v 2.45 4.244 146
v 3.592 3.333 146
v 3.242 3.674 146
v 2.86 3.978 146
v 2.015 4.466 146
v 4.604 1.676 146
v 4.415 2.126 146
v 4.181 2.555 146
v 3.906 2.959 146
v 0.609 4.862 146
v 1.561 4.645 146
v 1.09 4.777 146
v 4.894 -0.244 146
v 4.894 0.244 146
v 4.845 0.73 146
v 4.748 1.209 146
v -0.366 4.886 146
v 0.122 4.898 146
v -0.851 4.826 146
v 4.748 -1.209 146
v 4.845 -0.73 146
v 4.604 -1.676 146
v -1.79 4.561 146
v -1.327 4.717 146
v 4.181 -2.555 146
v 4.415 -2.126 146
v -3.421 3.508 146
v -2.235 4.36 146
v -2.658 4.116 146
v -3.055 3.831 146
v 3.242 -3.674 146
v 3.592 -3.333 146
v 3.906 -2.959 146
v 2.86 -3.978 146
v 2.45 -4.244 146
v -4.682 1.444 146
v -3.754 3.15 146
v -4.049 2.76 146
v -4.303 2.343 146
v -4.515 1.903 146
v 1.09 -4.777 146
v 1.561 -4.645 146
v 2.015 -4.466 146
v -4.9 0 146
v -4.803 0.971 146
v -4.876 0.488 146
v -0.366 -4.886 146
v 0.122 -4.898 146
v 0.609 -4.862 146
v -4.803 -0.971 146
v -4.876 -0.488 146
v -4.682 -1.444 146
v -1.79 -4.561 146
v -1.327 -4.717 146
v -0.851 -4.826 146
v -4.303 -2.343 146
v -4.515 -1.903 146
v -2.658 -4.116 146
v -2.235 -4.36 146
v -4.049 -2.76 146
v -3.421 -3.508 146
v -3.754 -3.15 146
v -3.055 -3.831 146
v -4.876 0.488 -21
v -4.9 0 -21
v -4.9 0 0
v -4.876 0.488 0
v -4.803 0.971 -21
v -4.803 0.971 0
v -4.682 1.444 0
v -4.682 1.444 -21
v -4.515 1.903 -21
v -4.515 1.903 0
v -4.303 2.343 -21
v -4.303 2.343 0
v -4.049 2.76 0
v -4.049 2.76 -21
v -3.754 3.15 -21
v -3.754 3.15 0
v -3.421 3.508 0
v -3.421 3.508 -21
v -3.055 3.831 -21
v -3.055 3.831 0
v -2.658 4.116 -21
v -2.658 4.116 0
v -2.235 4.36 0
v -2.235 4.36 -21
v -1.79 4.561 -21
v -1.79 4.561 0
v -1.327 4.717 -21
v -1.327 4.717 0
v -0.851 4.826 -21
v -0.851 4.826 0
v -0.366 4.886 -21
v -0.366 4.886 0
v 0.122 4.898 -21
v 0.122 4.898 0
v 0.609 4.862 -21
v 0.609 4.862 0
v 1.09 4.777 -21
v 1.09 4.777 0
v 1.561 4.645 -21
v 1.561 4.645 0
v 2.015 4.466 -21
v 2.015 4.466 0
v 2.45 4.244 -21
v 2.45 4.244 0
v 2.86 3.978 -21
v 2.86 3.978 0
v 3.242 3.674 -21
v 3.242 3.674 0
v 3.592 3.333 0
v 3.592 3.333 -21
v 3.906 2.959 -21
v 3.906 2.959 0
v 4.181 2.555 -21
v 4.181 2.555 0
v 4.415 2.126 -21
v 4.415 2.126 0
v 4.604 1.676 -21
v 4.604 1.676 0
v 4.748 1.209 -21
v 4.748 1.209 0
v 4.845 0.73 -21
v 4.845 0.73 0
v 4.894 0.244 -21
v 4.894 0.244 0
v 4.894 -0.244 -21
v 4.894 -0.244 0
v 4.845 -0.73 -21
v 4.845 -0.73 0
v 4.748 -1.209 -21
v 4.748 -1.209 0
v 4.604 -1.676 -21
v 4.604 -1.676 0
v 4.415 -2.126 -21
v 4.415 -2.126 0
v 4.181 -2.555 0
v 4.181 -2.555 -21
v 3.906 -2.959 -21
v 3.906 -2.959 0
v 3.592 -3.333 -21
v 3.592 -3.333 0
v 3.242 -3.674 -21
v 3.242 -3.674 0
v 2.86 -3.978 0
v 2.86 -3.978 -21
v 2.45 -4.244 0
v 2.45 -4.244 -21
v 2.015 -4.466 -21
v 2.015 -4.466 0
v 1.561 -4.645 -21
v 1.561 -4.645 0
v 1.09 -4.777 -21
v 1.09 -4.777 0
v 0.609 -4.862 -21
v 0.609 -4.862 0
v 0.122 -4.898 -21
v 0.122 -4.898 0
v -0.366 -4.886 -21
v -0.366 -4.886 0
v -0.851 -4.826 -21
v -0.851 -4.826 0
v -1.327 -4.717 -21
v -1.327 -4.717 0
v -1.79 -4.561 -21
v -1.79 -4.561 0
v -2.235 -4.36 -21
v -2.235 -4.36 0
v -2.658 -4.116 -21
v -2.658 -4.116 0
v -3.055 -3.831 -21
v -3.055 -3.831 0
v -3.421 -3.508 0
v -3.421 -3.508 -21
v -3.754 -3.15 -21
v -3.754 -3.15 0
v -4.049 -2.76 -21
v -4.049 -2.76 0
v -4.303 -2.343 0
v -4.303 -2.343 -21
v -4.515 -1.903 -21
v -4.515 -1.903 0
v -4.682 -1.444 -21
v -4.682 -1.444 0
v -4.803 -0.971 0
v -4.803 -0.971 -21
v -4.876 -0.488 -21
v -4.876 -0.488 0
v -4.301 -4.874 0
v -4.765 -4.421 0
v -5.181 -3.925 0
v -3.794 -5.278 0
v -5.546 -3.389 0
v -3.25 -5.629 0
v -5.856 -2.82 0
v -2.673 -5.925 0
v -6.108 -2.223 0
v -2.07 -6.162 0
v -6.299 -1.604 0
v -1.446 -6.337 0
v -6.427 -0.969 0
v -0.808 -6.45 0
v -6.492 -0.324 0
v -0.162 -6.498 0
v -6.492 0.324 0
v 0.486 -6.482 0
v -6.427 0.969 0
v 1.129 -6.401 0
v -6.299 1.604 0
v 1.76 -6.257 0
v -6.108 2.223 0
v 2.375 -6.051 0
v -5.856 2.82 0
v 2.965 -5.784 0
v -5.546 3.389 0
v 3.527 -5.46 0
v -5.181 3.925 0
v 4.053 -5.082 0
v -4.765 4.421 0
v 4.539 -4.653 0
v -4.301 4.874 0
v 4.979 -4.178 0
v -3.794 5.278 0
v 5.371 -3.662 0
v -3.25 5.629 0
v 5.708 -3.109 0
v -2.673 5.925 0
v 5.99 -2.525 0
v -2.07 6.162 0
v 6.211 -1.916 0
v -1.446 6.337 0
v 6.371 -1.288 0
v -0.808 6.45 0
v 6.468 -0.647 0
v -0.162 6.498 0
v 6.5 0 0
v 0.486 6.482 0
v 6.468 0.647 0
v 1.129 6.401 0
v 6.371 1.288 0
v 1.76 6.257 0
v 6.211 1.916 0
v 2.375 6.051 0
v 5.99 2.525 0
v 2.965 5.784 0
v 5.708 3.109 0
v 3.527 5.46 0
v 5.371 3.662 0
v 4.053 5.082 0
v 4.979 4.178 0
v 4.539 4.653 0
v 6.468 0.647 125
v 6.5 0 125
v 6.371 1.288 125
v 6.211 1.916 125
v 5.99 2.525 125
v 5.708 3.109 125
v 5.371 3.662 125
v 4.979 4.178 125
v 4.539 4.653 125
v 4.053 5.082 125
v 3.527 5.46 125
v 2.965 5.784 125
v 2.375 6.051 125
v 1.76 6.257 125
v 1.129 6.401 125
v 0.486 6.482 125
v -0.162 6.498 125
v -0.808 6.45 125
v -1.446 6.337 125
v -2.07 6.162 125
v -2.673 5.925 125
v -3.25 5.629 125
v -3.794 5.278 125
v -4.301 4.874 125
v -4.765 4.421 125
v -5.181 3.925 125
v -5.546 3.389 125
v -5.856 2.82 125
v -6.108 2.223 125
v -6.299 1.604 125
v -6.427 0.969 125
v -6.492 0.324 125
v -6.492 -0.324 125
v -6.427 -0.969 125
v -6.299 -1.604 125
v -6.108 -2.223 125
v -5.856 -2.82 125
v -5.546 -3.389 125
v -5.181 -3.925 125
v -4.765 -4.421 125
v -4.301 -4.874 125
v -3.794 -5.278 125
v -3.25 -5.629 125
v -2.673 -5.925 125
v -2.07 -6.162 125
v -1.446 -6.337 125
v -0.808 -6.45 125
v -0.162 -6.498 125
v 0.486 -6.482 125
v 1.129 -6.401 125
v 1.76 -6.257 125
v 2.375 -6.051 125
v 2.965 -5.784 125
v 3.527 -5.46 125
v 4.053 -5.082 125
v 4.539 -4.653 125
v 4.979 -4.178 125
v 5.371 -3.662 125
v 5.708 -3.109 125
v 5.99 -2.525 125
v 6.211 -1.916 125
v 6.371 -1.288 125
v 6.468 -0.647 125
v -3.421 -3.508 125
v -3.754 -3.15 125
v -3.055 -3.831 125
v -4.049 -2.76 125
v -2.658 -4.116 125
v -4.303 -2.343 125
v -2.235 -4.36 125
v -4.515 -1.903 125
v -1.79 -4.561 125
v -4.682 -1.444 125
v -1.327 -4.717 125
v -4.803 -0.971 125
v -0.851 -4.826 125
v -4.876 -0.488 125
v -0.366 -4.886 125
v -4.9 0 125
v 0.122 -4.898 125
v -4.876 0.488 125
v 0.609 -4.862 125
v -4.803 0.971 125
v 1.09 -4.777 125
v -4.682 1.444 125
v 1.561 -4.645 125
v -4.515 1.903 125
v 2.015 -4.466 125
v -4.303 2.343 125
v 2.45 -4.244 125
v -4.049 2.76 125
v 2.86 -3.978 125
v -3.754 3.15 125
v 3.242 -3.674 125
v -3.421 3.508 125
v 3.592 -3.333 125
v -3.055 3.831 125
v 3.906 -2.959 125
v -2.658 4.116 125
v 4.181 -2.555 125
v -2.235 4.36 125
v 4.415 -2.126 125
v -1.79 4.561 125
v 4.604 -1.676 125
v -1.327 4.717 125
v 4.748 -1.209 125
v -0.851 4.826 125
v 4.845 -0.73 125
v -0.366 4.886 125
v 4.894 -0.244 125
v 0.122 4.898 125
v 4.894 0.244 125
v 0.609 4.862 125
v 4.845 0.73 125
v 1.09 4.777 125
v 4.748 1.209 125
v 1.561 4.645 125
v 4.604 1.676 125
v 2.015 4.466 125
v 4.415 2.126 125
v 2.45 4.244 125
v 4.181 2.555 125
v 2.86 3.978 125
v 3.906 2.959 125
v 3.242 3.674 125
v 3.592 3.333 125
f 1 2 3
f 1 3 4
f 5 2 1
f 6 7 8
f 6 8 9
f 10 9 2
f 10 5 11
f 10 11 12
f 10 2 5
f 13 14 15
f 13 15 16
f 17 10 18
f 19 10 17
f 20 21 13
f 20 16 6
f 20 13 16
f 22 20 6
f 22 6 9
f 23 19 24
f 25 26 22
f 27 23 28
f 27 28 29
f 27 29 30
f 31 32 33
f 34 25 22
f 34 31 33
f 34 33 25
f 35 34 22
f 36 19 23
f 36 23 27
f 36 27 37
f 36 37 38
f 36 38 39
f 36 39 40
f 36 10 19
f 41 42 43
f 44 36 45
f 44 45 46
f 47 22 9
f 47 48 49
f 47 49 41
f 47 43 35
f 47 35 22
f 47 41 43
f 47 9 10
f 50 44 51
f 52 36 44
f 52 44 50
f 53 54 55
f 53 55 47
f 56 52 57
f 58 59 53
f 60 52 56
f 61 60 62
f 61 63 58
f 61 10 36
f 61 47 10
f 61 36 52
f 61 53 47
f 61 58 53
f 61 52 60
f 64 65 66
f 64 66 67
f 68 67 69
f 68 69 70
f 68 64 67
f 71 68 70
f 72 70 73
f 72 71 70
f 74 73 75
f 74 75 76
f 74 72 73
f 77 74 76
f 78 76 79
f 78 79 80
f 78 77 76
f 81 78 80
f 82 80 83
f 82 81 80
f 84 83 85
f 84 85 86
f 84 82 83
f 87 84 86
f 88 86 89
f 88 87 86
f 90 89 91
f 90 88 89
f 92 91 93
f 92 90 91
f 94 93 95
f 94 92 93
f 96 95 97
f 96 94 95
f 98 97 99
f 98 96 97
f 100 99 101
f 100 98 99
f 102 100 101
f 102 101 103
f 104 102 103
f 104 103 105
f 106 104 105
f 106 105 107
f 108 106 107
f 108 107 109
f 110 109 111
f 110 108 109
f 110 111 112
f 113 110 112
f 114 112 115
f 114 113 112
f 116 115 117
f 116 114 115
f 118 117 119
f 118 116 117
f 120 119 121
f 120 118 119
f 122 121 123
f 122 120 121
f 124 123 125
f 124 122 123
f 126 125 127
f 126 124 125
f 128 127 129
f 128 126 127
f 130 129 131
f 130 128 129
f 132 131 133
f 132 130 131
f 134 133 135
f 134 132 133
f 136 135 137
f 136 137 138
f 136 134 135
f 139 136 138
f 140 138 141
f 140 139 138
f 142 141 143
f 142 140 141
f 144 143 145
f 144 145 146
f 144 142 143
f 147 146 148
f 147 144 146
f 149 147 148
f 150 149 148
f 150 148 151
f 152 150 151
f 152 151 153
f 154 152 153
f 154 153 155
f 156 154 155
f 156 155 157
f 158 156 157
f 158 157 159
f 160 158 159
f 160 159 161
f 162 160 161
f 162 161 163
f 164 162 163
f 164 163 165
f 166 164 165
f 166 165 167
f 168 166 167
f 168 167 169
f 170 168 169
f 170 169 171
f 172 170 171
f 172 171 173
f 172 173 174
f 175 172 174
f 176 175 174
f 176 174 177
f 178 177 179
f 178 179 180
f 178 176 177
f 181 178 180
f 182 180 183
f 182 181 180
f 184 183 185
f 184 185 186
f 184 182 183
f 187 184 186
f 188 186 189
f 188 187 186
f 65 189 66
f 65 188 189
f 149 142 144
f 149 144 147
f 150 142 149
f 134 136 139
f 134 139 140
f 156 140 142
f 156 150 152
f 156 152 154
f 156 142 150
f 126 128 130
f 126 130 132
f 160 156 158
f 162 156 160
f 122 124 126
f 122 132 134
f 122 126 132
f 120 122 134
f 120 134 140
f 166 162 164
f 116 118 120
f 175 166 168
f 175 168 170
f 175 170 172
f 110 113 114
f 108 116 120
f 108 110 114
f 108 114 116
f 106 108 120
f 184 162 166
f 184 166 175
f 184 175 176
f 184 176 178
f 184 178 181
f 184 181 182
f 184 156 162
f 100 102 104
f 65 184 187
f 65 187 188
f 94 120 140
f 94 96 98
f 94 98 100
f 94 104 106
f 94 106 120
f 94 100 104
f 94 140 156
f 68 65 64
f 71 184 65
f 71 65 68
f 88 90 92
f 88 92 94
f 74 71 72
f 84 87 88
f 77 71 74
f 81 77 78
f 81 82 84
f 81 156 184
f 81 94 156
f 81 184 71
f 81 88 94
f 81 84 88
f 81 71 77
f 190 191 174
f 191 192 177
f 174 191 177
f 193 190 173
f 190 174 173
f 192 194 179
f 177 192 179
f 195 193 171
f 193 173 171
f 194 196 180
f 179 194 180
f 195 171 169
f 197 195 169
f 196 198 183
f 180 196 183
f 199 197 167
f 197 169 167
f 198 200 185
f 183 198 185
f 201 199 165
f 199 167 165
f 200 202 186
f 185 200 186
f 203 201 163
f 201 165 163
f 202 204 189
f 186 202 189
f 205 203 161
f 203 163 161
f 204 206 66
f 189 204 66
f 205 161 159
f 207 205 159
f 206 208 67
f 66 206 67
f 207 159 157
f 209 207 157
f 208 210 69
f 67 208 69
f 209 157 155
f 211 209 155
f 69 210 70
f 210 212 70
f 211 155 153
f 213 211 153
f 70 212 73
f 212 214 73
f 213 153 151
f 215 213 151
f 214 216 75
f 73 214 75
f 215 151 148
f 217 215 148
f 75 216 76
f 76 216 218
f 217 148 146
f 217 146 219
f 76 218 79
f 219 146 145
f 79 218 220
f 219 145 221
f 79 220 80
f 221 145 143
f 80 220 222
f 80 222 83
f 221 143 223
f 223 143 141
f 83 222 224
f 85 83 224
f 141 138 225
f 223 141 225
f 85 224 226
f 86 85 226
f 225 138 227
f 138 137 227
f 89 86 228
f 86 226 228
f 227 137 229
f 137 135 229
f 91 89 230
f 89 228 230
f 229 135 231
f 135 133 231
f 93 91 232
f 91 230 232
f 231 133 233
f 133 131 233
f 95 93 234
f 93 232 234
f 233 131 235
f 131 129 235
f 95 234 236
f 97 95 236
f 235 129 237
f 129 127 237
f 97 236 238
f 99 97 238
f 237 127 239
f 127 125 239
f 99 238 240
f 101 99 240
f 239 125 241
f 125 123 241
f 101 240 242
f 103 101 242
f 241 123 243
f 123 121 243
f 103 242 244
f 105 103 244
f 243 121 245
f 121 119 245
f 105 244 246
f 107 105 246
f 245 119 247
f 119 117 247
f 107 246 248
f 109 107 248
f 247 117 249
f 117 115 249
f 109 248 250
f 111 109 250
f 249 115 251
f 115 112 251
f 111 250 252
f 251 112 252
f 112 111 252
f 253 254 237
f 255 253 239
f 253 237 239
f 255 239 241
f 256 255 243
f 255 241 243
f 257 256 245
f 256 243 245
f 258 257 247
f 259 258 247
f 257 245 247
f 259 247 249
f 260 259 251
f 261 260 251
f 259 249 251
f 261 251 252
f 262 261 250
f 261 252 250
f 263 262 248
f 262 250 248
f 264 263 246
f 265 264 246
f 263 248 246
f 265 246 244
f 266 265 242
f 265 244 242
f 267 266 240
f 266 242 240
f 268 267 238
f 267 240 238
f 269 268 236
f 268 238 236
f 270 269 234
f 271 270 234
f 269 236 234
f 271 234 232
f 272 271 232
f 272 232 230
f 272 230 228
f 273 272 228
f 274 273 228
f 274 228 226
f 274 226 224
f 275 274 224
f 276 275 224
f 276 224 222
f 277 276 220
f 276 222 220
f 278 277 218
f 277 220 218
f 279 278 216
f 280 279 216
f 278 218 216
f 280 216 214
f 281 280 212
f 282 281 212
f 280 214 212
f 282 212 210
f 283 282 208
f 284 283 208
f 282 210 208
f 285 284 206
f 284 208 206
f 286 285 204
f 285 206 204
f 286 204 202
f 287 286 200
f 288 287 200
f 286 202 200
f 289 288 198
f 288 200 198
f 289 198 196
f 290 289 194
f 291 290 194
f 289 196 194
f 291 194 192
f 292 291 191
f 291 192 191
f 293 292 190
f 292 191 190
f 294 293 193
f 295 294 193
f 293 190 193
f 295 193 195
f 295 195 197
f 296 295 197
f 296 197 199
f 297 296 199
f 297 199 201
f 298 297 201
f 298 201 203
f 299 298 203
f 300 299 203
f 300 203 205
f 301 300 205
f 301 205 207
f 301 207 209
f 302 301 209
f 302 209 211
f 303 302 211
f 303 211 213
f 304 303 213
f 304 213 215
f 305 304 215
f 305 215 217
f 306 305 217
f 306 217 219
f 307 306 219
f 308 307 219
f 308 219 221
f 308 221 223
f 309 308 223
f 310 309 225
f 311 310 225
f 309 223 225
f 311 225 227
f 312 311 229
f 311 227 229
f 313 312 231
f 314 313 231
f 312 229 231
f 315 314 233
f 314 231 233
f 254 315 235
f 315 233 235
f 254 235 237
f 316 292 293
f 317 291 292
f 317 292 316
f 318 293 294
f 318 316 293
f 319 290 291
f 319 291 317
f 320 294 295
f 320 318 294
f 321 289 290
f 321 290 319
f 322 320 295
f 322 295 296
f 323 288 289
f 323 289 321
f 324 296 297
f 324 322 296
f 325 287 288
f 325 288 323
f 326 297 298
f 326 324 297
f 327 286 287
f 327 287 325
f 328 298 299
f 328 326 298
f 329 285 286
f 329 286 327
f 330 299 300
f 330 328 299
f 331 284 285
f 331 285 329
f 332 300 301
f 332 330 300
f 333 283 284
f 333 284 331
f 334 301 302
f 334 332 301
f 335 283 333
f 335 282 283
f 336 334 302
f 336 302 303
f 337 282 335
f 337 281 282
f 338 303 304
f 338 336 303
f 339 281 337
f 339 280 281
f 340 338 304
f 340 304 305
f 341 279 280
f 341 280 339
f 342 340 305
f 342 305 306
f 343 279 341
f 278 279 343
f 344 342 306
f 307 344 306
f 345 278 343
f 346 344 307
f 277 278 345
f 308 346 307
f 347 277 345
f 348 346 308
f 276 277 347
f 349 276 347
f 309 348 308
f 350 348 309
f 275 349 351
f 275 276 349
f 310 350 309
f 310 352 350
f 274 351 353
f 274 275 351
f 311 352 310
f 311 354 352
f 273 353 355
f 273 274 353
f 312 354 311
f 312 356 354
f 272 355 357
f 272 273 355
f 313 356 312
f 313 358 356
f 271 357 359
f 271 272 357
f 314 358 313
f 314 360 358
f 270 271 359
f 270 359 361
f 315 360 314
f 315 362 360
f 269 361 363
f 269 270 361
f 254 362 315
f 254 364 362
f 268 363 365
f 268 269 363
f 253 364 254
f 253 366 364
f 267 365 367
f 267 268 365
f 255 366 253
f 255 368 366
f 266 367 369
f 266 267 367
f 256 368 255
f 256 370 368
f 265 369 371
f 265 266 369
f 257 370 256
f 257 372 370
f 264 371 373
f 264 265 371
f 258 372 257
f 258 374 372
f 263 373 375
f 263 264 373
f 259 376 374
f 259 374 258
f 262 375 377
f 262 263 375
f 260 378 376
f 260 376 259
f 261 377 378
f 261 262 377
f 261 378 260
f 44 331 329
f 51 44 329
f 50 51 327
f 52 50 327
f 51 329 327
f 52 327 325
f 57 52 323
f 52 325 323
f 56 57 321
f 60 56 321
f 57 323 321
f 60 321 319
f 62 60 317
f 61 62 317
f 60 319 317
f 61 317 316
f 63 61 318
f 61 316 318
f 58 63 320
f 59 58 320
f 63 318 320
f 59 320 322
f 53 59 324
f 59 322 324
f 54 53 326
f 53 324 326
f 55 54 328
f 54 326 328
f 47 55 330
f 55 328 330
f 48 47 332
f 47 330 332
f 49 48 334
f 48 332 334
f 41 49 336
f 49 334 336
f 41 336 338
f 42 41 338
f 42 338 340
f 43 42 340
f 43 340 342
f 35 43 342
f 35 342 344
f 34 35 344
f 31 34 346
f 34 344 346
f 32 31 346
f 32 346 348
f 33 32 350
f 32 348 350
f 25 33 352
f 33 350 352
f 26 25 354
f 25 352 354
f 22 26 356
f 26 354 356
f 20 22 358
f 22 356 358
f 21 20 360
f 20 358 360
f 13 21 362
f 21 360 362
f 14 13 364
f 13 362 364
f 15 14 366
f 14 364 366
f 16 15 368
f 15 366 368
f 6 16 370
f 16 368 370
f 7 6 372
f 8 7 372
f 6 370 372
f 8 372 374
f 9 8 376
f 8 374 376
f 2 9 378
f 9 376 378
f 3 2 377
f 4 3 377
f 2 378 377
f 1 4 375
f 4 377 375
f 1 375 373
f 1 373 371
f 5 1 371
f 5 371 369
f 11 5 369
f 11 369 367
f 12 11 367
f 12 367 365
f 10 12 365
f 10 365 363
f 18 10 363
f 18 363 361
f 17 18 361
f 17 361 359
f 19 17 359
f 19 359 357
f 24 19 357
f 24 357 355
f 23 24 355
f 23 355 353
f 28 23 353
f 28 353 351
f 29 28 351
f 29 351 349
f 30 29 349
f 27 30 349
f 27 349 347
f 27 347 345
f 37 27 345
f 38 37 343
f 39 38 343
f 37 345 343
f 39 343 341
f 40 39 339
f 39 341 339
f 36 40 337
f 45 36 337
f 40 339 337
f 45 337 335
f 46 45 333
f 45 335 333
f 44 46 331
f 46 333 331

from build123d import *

# Parameters (mm, degrees)
SKETCH_1_R      = 6.5
EXTRUDE_1_DEPTH = 125
SKETCH_2_R      = 4.9
EXTRUDE_2_DEPTH = 21
EXTRUDE_START   = 21
SKETCH_3_R      = 4.9
EXTRUDE_3_DEPTH = 21


with BuildPart() as part:
    # 草图1 → 凸台-拉伸1 (new body)
    with BuildSketch(Plane.XY):
        Circle(SKETCH_1_R)
    extrude(amount=EXTRUDE_1_DEPTH)

    # 草图2 → 凸台-拉伸2 (add)
    with BuildSketch(Plane.XY.offset(125)):
        with Locations(Location((0, 0, 0), (0, 0, 180))):
            Circle(SKETCH_2_R)
    extrude(amount=EXTRUDE_2_DEPTH)

    # 草图3 → 凸台-拉伸3 (add)
    with BuildSketch(Plane(origin=(0, 0, 0), x_dir=(-1, 0, 0), z_dir=(0, 0, -1)).offset(EXTRUDE_START)):
        Circle(SKETCH_3_R)
    extrude(amount=-EXTRUDE_3_DEPTH)


solid = part.part
